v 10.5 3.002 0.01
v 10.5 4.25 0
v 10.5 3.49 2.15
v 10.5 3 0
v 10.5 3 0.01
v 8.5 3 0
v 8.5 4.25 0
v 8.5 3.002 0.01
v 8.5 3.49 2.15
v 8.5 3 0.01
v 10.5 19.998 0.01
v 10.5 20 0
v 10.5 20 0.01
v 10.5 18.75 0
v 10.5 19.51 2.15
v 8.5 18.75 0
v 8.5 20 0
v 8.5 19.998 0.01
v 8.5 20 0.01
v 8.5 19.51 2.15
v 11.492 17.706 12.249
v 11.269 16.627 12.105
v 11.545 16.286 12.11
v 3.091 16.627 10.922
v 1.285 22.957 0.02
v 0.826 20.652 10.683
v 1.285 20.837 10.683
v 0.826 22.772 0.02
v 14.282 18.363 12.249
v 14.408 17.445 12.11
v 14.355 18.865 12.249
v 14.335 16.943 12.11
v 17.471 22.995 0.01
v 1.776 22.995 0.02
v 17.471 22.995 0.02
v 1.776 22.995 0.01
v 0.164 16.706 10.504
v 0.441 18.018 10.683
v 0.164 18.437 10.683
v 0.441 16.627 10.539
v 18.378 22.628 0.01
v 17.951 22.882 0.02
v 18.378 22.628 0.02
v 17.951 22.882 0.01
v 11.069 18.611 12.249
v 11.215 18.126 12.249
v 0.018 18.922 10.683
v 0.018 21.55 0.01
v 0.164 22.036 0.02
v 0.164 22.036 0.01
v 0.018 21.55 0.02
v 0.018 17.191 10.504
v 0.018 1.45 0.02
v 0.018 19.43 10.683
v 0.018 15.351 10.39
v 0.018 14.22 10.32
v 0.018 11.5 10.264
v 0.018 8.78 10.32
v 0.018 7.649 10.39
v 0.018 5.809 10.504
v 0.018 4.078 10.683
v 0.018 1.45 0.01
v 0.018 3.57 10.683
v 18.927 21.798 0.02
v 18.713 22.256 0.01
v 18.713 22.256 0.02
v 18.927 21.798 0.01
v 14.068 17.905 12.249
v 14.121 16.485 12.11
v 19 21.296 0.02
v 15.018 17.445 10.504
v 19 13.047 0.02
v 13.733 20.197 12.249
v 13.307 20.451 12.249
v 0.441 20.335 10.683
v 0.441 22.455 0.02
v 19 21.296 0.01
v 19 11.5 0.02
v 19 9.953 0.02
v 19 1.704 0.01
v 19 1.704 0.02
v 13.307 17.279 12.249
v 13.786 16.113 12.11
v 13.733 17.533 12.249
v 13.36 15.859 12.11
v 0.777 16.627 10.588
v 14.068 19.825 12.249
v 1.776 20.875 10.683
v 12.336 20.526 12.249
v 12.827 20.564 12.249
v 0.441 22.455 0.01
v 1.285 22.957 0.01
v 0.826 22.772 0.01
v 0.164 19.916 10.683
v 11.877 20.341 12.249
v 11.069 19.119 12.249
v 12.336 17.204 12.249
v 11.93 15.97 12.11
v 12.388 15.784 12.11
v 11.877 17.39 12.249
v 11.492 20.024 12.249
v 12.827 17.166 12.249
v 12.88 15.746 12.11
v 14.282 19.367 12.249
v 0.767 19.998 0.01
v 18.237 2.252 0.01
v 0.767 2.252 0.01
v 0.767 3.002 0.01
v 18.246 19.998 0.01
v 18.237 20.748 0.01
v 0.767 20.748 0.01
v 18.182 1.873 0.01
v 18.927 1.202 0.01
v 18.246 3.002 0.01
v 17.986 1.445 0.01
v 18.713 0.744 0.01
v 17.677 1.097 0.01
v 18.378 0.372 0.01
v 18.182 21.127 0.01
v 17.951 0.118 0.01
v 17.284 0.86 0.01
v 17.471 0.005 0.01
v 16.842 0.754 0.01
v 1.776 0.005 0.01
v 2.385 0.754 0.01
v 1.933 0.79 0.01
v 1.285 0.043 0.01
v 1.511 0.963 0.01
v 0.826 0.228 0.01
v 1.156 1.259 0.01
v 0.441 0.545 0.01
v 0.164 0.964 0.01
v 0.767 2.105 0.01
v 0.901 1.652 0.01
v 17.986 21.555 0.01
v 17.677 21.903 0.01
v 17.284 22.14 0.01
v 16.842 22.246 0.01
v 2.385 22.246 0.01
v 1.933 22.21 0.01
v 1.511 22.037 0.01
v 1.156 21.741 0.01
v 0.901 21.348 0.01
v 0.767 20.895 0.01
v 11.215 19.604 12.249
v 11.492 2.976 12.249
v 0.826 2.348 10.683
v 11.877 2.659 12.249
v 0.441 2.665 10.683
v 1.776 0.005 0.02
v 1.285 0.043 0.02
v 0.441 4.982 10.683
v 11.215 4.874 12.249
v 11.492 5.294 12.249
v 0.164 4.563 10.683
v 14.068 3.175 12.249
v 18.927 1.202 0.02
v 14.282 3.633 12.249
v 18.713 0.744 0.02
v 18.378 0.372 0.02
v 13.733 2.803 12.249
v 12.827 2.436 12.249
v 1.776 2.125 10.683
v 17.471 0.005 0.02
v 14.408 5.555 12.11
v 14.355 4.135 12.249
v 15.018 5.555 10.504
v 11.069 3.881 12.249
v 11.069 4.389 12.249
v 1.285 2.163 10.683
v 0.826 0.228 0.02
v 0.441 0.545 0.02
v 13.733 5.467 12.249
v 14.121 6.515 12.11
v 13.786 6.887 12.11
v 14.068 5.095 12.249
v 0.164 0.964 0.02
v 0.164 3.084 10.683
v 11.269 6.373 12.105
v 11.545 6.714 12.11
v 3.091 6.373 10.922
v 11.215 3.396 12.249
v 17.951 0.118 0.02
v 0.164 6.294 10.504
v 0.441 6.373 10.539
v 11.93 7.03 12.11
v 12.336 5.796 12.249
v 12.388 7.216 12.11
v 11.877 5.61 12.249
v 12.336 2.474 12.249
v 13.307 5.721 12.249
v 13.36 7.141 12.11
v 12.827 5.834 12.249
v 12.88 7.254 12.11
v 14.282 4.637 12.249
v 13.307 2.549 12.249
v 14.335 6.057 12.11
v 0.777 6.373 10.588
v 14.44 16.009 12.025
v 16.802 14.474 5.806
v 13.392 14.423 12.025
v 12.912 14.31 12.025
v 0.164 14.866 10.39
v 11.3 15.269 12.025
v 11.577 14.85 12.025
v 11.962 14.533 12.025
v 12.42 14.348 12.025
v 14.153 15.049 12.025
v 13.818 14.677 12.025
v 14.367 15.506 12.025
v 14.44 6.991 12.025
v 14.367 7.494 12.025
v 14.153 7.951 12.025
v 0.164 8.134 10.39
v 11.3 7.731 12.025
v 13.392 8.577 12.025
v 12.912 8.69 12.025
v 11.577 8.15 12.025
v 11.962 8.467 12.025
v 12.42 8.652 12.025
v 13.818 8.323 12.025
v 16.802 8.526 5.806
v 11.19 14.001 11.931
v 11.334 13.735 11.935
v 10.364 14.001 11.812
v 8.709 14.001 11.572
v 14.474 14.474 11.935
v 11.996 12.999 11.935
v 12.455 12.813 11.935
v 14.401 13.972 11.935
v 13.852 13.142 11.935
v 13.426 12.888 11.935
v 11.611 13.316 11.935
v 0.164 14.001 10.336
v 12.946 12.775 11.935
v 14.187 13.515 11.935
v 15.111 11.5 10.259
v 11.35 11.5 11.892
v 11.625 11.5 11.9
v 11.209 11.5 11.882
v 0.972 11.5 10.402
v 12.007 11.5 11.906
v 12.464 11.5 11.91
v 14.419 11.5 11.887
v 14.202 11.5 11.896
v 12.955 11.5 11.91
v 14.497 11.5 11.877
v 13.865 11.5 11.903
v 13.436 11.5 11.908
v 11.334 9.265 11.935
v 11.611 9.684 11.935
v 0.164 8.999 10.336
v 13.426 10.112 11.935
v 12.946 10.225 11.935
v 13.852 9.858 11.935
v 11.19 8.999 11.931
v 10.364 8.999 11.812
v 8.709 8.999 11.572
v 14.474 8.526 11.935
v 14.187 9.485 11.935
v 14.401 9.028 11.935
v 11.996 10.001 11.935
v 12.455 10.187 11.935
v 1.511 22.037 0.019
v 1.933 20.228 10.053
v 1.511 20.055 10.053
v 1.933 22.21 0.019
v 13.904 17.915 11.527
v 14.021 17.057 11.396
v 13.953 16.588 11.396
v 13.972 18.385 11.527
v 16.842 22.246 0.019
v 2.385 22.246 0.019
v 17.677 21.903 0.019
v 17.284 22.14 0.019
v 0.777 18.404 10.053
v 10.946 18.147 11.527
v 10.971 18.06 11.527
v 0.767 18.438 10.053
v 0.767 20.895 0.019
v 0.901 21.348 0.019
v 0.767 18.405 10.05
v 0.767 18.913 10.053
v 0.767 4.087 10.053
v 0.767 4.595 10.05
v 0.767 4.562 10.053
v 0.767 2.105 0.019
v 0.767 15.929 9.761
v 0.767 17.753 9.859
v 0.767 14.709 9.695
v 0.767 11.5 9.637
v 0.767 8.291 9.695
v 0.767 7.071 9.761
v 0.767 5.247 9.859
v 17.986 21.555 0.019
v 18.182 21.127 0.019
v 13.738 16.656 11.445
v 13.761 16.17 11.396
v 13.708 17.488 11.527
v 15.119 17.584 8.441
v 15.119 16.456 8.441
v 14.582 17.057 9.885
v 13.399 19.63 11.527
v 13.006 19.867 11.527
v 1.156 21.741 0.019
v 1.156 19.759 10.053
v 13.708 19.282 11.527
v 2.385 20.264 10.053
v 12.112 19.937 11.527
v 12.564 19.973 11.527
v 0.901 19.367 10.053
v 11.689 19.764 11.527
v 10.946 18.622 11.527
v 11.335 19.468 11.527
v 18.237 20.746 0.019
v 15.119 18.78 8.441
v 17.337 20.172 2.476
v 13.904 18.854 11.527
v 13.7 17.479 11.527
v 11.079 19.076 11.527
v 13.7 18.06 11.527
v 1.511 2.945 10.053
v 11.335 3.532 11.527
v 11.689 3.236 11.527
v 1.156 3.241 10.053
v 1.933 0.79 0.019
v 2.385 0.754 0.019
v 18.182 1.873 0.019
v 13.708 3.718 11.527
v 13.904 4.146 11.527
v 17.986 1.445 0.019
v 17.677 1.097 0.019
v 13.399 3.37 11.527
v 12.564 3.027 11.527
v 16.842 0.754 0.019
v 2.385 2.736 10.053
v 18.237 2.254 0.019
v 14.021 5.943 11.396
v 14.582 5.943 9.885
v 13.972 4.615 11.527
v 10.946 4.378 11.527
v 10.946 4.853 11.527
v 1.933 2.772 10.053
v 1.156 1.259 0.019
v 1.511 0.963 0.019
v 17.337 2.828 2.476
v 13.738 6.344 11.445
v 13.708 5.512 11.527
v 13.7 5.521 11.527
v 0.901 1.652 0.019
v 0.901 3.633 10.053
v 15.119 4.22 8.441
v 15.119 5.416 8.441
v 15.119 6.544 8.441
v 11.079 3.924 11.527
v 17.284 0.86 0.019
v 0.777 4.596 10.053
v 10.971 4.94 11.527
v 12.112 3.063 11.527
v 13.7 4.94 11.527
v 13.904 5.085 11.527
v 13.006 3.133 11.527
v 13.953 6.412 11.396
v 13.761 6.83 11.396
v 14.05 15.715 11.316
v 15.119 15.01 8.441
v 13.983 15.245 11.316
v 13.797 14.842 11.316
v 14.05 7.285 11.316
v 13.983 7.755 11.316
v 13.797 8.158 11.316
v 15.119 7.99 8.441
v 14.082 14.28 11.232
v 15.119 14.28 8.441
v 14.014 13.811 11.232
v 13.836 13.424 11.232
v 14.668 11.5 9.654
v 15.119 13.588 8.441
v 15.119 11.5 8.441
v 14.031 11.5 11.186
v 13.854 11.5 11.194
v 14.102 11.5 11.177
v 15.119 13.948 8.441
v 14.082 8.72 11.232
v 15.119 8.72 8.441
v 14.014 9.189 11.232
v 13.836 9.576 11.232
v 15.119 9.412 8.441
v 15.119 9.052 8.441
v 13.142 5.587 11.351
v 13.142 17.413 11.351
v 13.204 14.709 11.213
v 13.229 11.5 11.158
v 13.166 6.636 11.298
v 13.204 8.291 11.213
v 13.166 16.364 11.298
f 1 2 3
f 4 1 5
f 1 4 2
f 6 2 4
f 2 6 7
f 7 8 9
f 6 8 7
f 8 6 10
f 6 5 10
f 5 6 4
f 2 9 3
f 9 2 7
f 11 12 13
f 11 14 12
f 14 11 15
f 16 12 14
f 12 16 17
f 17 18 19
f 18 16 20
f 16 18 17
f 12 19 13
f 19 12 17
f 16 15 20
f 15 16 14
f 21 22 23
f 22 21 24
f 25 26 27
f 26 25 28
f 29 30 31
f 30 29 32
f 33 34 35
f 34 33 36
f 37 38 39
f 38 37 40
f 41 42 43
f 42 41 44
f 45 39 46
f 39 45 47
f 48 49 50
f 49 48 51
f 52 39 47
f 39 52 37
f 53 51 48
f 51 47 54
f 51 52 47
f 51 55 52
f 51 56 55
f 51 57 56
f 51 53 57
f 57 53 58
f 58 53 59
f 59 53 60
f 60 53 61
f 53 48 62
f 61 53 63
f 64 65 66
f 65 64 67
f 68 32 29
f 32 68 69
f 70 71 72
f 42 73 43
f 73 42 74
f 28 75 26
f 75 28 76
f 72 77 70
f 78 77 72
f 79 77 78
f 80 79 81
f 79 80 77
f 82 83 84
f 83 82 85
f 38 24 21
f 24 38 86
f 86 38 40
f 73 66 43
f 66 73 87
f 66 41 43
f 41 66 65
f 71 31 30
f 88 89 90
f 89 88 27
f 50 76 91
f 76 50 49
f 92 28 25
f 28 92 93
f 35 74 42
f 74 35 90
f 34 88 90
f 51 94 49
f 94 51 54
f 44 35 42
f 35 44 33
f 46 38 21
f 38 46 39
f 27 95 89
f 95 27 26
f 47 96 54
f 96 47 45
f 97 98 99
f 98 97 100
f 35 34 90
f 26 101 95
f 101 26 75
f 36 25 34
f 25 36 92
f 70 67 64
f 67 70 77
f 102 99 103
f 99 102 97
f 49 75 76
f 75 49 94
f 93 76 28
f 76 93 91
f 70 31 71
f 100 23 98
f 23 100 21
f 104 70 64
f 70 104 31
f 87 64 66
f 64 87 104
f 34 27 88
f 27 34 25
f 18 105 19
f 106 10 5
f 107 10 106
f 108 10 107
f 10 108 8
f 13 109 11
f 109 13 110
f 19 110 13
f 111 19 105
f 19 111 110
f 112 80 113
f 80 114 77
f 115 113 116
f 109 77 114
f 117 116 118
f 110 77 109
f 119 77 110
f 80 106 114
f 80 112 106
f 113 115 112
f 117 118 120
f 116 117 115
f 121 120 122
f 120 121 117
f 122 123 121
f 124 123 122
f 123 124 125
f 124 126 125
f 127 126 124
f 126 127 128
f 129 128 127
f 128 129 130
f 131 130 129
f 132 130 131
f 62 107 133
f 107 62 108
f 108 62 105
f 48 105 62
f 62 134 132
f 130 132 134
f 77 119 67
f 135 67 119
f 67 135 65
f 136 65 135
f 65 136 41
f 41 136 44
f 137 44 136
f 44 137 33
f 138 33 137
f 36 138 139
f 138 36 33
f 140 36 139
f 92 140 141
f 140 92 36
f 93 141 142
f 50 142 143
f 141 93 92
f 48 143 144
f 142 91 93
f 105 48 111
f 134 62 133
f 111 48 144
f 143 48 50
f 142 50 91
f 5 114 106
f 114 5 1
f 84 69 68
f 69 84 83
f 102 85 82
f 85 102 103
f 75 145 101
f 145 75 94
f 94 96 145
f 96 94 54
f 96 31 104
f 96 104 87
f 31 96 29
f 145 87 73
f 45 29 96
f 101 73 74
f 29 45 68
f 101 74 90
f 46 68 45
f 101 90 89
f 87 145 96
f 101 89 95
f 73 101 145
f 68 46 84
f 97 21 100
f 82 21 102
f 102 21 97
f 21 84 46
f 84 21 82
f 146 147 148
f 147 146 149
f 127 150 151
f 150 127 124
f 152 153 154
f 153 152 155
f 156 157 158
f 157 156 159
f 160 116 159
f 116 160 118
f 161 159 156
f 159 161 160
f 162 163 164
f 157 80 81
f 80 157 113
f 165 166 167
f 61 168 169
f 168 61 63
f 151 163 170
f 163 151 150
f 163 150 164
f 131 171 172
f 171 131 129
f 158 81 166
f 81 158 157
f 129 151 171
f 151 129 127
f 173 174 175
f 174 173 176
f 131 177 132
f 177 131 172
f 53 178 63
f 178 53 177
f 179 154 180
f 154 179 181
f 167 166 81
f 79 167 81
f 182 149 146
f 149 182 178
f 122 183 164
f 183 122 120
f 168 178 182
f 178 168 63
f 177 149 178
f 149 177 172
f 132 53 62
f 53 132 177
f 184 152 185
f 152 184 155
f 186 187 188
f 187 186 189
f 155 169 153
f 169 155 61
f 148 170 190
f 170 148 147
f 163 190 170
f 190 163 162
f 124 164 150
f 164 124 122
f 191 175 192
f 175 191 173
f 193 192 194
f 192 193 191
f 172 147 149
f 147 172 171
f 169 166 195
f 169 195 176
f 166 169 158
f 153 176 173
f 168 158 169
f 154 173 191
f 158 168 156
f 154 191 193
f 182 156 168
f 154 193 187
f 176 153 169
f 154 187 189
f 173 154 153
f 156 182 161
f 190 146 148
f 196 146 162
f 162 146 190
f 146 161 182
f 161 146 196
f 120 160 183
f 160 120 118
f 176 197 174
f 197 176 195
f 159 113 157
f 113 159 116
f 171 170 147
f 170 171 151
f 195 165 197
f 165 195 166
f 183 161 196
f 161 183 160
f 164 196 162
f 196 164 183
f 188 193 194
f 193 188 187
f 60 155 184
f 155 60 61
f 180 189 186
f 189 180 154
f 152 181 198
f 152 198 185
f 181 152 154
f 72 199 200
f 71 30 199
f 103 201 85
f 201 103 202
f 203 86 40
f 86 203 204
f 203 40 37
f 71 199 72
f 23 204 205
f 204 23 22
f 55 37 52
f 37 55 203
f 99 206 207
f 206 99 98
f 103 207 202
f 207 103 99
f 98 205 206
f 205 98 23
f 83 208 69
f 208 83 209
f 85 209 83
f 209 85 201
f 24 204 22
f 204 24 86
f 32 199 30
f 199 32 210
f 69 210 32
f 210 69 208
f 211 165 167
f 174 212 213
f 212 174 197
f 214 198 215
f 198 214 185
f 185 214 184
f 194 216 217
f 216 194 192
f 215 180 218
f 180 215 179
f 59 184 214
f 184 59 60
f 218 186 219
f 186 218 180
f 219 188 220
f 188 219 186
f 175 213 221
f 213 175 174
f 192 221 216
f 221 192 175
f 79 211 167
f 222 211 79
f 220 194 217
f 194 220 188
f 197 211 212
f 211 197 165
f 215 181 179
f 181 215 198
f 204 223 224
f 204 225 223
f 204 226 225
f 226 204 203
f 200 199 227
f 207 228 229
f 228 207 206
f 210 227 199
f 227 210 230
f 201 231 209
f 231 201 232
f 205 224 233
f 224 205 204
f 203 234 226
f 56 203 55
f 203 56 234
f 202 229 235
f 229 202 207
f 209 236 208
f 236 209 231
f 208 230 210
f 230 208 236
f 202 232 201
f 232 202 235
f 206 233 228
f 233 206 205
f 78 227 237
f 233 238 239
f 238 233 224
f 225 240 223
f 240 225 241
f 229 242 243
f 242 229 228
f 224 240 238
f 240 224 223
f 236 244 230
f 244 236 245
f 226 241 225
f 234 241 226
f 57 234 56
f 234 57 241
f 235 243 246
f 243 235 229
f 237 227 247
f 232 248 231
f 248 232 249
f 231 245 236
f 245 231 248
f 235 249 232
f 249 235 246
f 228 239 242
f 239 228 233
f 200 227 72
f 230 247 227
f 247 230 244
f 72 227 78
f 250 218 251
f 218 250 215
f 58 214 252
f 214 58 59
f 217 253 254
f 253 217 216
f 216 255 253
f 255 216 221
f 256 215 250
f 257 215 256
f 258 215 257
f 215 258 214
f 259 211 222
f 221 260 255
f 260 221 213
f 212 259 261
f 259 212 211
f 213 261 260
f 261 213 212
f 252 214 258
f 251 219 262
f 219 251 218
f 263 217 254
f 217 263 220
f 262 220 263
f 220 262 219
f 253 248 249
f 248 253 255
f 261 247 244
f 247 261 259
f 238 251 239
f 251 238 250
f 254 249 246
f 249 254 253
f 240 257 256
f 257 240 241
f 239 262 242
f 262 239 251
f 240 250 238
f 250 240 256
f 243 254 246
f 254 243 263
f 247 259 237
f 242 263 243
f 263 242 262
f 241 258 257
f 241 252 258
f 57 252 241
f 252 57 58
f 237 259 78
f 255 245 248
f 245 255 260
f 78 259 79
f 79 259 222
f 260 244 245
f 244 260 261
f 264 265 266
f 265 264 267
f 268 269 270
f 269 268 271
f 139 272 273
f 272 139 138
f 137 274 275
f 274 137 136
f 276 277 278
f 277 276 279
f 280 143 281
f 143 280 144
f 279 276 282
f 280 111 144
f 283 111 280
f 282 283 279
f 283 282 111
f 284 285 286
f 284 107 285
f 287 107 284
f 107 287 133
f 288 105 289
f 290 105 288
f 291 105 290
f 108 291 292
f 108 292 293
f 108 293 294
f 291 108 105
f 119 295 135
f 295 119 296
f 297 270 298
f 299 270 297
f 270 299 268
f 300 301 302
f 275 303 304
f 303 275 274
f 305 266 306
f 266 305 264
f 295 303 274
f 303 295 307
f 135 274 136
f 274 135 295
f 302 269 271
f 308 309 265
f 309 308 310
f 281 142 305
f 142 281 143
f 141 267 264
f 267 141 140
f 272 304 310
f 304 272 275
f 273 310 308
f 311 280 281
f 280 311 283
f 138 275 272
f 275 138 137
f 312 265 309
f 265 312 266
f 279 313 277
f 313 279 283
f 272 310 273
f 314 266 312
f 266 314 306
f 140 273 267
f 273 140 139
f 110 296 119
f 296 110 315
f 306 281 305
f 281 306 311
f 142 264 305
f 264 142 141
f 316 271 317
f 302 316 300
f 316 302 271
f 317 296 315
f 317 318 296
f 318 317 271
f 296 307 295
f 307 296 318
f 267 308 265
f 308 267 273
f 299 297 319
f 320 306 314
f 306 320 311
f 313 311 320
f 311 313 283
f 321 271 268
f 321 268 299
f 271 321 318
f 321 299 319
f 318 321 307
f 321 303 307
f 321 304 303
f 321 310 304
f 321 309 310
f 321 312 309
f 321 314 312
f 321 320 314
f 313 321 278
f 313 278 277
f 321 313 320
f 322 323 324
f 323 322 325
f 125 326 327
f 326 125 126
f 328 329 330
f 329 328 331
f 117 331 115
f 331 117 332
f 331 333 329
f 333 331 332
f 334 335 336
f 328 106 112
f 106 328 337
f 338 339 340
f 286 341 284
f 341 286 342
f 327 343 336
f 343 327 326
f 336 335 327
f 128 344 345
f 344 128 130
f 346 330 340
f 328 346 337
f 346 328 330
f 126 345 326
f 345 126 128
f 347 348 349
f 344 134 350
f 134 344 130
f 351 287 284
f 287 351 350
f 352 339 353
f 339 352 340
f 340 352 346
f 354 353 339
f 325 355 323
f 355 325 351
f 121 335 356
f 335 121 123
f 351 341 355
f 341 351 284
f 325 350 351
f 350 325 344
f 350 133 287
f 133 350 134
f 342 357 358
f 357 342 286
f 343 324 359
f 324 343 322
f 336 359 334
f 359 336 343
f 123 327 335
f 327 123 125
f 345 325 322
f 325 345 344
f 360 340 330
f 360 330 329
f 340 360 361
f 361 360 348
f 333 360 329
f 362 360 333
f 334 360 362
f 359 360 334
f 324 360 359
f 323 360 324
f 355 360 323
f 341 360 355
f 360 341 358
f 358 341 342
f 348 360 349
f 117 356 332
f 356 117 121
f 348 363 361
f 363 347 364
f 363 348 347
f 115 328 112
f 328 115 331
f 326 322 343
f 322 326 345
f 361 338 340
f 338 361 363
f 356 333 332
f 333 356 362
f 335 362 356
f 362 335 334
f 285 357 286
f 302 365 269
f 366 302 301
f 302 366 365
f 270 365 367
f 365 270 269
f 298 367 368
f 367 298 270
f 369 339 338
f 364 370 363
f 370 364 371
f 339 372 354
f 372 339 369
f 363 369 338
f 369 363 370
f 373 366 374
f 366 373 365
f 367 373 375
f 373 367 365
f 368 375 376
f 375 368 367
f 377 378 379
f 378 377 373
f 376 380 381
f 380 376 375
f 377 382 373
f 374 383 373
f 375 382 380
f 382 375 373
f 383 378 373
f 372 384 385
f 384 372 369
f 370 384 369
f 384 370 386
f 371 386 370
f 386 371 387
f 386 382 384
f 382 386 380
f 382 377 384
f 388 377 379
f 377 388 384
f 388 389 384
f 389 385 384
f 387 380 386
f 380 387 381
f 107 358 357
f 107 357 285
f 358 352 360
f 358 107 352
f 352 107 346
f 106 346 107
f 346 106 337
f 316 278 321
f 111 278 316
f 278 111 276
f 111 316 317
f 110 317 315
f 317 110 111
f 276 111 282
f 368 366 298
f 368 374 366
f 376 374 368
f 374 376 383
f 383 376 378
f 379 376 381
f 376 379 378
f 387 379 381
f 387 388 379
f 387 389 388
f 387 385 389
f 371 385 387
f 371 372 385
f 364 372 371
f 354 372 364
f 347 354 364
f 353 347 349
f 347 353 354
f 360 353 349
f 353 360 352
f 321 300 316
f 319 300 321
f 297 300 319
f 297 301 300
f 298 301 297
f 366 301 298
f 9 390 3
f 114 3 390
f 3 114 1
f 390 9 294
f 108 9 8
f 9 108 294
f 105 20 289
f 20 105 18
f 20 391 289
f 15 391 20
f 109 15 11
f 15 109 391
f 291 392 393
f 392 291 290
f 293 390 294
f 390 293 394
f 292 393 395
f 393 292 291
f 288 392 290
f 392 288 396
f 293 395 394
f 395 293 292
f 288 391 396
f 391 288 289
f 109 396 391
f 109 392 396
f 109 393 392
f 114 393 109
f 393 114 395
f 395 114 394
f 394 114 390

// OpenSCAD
//measures are in millimeters
AY=23.0;
AX=19.0;
INNER_AY=18.5;
INNER_BY=12.5;
BY=18.0;
BLX=14.5;
EZ=11.0;
FLZ=14.0;
H=12.72;
CYL_OFF_Z=100;
CYL_DEPTH=0.05;
CLIP_X=2;
CLIP_Y=1.25;
CLIP_H=3*CLIP_Y;
CLIP_DISTANCE=17.0;
CORNER_RADIUS=2;
WallThickness=0.75;

alpha=asin((H-EZ)/BLX);
beta=asin(H/FLZ);
gamma=90-asin((0.5*(AY-BY))/EZ);

module keycap(){
	scale([AX/(AX+2*CORNER_RADIUS),AY/(AY+2*CORNER_RADIUS),1])
	translate([CORNER_RADIUS,CORNER_RADIUS,0.01])
	minkowski(){
		difference(){
			cube([AX,AY,H]);
			rotate(a=gamma,v=[1,0,0]) cube([100,100,100]);
			translate([0,AY,0]) rotate(a=90-gamma,v=[1,0,0]) cube([100,100,100]);
			translate([0,0,EZ]) rotate(a=-alpha,v=[0,1,0]) translate([-50,0,0]) cube([100,100,100]);
			translate([0,AY/2,EZ+CYL_OFF_Z]) rotate(a=90-alpha,v=[0,1,0]) cylinder(h=100,center=true,r=CYL_OFF_Z+CYL_DEPTH,$fa=2);
			translate([AX,0,0]) rotate(a=beta-90,v=[0,1,0]) cube([100,100,100]);
		}
		cylinder(h=0.01,r=CORNER_RADIUS,$fs=0.6);
	}
}

module struts(){
	difference(){
		cube([AX,INNER_AY,H]);
		rotate(a=gamma,v=[1,0,0]) cube([100,100,100]);
		translate([0,INNER_AY,0]) rotate(a=90-gamma,v=[1,0,0]) cube([100,100,100]);
		translate([0,0,EZ]) rotate(a=-alpha,v=[0,1,0]) translate([-50,0,0]) cube([100,100,100]);
		translate([0,INNER_AY/2,EZ+CYL_OFF_Z]) rotate(a=90-alpha,v=[0,1,0]) cylinder(h=100,center=true,r=CYL_OFF_Z+CYL_DEPTH,$fa=2);
		translate([AX,0,0]) rotate(a=beta-90,v=[0,1,0]) cube([100,100,100]);
	}
}

module clip(){
	difference(){
		cube([CLIP_X,CLIP_Y,CLIP_H]);
        translate([-1,CLIP_Y,0]) rotate(a=asin(CLIP_Y/CLIP_H),v=[1,0,0]) cube([100,100,100]);
        rotate(a=gamma, v=[1, 0, 0]) translate([-1, 0, WallThickness-0.1]) cube([100, 100, 100]);
    }
}

translate([(AX-CLIP_X)/2,(AY-CLIP_DISTANCE)/2,0]) clip();
translate([(AX-CLIP_X)/2,(AY+CLIP_DISTANCE)/2,0]) mirror([0,1,0]) clip();

difference(){
	keycap();
	difference(){
		translate([WallThickness, WallThickness, 0]) scale(v=[1-2*WallThickness/AX, 1-2*WallThickness/AY, 1-WallThickness/H]) keycap();
		translate([0,(AY-INNER_AY)/2,0]) difference(){
			struts();
			translate([WallThickness, WallThickness, 0]) scale(v=[1-2*WallThickness/AX, 1-2*WallThickness/INNER_AY, 1-WallThickness/H]) struts();
		}
	}
}
